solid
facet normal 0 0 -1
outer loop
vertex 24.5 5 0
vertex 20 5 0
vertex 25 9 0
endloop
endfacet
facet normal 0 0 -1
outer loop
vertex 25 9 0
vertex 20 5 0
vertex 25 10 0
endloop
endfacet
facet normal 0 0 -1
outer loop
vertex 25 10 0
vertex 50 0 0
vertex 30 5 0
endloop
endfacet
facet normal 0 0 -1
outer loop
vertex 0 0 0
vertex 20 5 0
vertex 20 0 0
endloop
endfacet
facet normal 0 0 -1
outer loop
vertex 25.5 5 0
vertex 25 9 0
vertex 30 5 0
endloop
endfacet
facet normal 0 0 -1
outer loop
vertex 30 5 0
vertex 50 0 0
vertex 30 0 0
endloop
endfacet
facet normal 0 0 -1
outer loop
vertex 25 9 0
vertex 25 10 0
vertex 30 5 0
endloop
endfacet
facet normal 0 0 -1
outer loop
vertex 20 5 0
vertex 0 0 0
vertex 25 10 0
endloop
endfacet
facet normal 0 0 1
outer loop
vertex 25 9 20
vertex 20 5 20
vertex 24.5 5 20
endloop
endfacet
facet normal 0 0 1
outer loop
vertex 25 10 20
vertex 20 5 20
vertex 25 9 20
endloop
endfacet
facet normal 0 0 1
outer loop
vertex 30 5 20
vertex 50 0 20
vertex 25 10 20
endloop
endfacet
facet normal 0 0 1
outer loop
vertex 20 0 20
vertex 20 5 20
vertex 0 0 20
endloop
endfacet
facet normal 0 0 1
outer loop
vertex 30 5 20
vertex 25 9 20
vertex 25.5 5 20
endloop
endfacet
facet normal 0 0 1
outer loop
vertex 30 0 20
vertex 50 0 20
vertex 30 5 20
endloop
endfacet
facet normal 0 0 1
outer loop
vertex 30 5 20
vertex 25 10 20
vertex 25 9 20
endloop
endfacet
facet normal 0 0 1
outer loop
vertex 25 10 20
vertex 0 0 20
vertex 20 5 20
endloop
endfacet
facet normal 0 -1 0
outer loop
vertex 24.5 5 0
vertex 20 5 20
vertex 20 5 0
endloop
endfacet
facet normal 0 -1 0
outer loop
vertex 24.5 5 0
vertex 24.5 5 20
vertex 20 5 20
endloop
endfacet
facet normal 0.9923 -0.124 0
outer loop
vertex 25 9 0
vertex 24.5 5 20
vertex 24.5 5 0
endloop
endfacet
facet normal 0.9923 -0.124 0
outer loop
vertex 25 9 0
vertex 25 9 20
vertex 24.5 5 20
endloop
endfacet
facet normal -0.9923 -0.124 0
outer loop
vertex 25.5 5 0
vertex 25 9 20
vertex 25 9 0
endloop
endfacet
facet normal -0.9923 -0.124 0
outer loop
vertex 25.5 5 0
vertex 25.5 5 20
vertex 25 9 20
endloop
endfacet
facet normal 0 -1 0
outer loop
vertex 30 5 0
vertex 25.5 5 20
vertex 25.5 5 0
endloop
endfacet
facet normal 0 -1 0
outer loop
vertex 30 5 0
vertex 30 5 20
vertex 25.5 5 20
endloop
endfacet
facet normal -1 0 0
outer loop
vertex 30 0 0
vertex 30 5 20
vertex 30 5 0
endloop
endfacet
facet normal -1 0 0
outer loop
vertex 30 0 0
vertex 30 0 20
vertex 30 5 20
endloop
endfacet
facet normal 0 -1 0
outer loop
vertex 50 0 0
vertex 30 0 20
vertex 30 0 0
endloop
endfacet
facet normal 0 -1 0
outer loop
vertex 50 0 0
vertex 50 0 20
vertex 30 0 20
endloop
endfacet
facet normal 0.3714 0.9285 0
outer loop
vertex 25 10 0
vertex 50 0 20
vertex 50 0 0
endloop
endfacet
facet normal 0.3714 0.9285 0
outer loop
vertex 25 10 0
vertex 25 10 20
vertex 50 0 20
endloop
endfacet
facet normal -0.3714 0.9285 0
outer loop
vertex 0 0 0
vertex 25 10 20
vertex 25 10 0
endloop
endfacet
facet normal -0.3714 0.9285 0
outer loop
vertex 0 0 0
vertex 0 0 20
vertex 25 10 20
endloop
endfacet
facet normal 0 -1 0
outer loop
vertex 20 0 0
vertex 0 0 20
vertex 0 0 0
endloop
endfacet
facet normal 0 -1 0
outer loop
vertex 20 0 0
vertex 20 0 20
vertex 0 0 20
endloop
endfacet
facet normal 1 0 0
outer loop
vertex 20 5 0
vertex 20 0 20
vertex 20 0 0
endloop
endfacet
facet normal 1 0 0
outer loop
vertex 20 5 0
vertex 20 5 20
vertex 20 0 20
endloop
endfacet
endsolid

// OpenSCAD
 linear_extrude(20) polygon([[0,0],[25,10],[50,0], [30,0],[30,5],[25.5,5],[25,9],[24.5,5],[20,5],[20,0]]);
